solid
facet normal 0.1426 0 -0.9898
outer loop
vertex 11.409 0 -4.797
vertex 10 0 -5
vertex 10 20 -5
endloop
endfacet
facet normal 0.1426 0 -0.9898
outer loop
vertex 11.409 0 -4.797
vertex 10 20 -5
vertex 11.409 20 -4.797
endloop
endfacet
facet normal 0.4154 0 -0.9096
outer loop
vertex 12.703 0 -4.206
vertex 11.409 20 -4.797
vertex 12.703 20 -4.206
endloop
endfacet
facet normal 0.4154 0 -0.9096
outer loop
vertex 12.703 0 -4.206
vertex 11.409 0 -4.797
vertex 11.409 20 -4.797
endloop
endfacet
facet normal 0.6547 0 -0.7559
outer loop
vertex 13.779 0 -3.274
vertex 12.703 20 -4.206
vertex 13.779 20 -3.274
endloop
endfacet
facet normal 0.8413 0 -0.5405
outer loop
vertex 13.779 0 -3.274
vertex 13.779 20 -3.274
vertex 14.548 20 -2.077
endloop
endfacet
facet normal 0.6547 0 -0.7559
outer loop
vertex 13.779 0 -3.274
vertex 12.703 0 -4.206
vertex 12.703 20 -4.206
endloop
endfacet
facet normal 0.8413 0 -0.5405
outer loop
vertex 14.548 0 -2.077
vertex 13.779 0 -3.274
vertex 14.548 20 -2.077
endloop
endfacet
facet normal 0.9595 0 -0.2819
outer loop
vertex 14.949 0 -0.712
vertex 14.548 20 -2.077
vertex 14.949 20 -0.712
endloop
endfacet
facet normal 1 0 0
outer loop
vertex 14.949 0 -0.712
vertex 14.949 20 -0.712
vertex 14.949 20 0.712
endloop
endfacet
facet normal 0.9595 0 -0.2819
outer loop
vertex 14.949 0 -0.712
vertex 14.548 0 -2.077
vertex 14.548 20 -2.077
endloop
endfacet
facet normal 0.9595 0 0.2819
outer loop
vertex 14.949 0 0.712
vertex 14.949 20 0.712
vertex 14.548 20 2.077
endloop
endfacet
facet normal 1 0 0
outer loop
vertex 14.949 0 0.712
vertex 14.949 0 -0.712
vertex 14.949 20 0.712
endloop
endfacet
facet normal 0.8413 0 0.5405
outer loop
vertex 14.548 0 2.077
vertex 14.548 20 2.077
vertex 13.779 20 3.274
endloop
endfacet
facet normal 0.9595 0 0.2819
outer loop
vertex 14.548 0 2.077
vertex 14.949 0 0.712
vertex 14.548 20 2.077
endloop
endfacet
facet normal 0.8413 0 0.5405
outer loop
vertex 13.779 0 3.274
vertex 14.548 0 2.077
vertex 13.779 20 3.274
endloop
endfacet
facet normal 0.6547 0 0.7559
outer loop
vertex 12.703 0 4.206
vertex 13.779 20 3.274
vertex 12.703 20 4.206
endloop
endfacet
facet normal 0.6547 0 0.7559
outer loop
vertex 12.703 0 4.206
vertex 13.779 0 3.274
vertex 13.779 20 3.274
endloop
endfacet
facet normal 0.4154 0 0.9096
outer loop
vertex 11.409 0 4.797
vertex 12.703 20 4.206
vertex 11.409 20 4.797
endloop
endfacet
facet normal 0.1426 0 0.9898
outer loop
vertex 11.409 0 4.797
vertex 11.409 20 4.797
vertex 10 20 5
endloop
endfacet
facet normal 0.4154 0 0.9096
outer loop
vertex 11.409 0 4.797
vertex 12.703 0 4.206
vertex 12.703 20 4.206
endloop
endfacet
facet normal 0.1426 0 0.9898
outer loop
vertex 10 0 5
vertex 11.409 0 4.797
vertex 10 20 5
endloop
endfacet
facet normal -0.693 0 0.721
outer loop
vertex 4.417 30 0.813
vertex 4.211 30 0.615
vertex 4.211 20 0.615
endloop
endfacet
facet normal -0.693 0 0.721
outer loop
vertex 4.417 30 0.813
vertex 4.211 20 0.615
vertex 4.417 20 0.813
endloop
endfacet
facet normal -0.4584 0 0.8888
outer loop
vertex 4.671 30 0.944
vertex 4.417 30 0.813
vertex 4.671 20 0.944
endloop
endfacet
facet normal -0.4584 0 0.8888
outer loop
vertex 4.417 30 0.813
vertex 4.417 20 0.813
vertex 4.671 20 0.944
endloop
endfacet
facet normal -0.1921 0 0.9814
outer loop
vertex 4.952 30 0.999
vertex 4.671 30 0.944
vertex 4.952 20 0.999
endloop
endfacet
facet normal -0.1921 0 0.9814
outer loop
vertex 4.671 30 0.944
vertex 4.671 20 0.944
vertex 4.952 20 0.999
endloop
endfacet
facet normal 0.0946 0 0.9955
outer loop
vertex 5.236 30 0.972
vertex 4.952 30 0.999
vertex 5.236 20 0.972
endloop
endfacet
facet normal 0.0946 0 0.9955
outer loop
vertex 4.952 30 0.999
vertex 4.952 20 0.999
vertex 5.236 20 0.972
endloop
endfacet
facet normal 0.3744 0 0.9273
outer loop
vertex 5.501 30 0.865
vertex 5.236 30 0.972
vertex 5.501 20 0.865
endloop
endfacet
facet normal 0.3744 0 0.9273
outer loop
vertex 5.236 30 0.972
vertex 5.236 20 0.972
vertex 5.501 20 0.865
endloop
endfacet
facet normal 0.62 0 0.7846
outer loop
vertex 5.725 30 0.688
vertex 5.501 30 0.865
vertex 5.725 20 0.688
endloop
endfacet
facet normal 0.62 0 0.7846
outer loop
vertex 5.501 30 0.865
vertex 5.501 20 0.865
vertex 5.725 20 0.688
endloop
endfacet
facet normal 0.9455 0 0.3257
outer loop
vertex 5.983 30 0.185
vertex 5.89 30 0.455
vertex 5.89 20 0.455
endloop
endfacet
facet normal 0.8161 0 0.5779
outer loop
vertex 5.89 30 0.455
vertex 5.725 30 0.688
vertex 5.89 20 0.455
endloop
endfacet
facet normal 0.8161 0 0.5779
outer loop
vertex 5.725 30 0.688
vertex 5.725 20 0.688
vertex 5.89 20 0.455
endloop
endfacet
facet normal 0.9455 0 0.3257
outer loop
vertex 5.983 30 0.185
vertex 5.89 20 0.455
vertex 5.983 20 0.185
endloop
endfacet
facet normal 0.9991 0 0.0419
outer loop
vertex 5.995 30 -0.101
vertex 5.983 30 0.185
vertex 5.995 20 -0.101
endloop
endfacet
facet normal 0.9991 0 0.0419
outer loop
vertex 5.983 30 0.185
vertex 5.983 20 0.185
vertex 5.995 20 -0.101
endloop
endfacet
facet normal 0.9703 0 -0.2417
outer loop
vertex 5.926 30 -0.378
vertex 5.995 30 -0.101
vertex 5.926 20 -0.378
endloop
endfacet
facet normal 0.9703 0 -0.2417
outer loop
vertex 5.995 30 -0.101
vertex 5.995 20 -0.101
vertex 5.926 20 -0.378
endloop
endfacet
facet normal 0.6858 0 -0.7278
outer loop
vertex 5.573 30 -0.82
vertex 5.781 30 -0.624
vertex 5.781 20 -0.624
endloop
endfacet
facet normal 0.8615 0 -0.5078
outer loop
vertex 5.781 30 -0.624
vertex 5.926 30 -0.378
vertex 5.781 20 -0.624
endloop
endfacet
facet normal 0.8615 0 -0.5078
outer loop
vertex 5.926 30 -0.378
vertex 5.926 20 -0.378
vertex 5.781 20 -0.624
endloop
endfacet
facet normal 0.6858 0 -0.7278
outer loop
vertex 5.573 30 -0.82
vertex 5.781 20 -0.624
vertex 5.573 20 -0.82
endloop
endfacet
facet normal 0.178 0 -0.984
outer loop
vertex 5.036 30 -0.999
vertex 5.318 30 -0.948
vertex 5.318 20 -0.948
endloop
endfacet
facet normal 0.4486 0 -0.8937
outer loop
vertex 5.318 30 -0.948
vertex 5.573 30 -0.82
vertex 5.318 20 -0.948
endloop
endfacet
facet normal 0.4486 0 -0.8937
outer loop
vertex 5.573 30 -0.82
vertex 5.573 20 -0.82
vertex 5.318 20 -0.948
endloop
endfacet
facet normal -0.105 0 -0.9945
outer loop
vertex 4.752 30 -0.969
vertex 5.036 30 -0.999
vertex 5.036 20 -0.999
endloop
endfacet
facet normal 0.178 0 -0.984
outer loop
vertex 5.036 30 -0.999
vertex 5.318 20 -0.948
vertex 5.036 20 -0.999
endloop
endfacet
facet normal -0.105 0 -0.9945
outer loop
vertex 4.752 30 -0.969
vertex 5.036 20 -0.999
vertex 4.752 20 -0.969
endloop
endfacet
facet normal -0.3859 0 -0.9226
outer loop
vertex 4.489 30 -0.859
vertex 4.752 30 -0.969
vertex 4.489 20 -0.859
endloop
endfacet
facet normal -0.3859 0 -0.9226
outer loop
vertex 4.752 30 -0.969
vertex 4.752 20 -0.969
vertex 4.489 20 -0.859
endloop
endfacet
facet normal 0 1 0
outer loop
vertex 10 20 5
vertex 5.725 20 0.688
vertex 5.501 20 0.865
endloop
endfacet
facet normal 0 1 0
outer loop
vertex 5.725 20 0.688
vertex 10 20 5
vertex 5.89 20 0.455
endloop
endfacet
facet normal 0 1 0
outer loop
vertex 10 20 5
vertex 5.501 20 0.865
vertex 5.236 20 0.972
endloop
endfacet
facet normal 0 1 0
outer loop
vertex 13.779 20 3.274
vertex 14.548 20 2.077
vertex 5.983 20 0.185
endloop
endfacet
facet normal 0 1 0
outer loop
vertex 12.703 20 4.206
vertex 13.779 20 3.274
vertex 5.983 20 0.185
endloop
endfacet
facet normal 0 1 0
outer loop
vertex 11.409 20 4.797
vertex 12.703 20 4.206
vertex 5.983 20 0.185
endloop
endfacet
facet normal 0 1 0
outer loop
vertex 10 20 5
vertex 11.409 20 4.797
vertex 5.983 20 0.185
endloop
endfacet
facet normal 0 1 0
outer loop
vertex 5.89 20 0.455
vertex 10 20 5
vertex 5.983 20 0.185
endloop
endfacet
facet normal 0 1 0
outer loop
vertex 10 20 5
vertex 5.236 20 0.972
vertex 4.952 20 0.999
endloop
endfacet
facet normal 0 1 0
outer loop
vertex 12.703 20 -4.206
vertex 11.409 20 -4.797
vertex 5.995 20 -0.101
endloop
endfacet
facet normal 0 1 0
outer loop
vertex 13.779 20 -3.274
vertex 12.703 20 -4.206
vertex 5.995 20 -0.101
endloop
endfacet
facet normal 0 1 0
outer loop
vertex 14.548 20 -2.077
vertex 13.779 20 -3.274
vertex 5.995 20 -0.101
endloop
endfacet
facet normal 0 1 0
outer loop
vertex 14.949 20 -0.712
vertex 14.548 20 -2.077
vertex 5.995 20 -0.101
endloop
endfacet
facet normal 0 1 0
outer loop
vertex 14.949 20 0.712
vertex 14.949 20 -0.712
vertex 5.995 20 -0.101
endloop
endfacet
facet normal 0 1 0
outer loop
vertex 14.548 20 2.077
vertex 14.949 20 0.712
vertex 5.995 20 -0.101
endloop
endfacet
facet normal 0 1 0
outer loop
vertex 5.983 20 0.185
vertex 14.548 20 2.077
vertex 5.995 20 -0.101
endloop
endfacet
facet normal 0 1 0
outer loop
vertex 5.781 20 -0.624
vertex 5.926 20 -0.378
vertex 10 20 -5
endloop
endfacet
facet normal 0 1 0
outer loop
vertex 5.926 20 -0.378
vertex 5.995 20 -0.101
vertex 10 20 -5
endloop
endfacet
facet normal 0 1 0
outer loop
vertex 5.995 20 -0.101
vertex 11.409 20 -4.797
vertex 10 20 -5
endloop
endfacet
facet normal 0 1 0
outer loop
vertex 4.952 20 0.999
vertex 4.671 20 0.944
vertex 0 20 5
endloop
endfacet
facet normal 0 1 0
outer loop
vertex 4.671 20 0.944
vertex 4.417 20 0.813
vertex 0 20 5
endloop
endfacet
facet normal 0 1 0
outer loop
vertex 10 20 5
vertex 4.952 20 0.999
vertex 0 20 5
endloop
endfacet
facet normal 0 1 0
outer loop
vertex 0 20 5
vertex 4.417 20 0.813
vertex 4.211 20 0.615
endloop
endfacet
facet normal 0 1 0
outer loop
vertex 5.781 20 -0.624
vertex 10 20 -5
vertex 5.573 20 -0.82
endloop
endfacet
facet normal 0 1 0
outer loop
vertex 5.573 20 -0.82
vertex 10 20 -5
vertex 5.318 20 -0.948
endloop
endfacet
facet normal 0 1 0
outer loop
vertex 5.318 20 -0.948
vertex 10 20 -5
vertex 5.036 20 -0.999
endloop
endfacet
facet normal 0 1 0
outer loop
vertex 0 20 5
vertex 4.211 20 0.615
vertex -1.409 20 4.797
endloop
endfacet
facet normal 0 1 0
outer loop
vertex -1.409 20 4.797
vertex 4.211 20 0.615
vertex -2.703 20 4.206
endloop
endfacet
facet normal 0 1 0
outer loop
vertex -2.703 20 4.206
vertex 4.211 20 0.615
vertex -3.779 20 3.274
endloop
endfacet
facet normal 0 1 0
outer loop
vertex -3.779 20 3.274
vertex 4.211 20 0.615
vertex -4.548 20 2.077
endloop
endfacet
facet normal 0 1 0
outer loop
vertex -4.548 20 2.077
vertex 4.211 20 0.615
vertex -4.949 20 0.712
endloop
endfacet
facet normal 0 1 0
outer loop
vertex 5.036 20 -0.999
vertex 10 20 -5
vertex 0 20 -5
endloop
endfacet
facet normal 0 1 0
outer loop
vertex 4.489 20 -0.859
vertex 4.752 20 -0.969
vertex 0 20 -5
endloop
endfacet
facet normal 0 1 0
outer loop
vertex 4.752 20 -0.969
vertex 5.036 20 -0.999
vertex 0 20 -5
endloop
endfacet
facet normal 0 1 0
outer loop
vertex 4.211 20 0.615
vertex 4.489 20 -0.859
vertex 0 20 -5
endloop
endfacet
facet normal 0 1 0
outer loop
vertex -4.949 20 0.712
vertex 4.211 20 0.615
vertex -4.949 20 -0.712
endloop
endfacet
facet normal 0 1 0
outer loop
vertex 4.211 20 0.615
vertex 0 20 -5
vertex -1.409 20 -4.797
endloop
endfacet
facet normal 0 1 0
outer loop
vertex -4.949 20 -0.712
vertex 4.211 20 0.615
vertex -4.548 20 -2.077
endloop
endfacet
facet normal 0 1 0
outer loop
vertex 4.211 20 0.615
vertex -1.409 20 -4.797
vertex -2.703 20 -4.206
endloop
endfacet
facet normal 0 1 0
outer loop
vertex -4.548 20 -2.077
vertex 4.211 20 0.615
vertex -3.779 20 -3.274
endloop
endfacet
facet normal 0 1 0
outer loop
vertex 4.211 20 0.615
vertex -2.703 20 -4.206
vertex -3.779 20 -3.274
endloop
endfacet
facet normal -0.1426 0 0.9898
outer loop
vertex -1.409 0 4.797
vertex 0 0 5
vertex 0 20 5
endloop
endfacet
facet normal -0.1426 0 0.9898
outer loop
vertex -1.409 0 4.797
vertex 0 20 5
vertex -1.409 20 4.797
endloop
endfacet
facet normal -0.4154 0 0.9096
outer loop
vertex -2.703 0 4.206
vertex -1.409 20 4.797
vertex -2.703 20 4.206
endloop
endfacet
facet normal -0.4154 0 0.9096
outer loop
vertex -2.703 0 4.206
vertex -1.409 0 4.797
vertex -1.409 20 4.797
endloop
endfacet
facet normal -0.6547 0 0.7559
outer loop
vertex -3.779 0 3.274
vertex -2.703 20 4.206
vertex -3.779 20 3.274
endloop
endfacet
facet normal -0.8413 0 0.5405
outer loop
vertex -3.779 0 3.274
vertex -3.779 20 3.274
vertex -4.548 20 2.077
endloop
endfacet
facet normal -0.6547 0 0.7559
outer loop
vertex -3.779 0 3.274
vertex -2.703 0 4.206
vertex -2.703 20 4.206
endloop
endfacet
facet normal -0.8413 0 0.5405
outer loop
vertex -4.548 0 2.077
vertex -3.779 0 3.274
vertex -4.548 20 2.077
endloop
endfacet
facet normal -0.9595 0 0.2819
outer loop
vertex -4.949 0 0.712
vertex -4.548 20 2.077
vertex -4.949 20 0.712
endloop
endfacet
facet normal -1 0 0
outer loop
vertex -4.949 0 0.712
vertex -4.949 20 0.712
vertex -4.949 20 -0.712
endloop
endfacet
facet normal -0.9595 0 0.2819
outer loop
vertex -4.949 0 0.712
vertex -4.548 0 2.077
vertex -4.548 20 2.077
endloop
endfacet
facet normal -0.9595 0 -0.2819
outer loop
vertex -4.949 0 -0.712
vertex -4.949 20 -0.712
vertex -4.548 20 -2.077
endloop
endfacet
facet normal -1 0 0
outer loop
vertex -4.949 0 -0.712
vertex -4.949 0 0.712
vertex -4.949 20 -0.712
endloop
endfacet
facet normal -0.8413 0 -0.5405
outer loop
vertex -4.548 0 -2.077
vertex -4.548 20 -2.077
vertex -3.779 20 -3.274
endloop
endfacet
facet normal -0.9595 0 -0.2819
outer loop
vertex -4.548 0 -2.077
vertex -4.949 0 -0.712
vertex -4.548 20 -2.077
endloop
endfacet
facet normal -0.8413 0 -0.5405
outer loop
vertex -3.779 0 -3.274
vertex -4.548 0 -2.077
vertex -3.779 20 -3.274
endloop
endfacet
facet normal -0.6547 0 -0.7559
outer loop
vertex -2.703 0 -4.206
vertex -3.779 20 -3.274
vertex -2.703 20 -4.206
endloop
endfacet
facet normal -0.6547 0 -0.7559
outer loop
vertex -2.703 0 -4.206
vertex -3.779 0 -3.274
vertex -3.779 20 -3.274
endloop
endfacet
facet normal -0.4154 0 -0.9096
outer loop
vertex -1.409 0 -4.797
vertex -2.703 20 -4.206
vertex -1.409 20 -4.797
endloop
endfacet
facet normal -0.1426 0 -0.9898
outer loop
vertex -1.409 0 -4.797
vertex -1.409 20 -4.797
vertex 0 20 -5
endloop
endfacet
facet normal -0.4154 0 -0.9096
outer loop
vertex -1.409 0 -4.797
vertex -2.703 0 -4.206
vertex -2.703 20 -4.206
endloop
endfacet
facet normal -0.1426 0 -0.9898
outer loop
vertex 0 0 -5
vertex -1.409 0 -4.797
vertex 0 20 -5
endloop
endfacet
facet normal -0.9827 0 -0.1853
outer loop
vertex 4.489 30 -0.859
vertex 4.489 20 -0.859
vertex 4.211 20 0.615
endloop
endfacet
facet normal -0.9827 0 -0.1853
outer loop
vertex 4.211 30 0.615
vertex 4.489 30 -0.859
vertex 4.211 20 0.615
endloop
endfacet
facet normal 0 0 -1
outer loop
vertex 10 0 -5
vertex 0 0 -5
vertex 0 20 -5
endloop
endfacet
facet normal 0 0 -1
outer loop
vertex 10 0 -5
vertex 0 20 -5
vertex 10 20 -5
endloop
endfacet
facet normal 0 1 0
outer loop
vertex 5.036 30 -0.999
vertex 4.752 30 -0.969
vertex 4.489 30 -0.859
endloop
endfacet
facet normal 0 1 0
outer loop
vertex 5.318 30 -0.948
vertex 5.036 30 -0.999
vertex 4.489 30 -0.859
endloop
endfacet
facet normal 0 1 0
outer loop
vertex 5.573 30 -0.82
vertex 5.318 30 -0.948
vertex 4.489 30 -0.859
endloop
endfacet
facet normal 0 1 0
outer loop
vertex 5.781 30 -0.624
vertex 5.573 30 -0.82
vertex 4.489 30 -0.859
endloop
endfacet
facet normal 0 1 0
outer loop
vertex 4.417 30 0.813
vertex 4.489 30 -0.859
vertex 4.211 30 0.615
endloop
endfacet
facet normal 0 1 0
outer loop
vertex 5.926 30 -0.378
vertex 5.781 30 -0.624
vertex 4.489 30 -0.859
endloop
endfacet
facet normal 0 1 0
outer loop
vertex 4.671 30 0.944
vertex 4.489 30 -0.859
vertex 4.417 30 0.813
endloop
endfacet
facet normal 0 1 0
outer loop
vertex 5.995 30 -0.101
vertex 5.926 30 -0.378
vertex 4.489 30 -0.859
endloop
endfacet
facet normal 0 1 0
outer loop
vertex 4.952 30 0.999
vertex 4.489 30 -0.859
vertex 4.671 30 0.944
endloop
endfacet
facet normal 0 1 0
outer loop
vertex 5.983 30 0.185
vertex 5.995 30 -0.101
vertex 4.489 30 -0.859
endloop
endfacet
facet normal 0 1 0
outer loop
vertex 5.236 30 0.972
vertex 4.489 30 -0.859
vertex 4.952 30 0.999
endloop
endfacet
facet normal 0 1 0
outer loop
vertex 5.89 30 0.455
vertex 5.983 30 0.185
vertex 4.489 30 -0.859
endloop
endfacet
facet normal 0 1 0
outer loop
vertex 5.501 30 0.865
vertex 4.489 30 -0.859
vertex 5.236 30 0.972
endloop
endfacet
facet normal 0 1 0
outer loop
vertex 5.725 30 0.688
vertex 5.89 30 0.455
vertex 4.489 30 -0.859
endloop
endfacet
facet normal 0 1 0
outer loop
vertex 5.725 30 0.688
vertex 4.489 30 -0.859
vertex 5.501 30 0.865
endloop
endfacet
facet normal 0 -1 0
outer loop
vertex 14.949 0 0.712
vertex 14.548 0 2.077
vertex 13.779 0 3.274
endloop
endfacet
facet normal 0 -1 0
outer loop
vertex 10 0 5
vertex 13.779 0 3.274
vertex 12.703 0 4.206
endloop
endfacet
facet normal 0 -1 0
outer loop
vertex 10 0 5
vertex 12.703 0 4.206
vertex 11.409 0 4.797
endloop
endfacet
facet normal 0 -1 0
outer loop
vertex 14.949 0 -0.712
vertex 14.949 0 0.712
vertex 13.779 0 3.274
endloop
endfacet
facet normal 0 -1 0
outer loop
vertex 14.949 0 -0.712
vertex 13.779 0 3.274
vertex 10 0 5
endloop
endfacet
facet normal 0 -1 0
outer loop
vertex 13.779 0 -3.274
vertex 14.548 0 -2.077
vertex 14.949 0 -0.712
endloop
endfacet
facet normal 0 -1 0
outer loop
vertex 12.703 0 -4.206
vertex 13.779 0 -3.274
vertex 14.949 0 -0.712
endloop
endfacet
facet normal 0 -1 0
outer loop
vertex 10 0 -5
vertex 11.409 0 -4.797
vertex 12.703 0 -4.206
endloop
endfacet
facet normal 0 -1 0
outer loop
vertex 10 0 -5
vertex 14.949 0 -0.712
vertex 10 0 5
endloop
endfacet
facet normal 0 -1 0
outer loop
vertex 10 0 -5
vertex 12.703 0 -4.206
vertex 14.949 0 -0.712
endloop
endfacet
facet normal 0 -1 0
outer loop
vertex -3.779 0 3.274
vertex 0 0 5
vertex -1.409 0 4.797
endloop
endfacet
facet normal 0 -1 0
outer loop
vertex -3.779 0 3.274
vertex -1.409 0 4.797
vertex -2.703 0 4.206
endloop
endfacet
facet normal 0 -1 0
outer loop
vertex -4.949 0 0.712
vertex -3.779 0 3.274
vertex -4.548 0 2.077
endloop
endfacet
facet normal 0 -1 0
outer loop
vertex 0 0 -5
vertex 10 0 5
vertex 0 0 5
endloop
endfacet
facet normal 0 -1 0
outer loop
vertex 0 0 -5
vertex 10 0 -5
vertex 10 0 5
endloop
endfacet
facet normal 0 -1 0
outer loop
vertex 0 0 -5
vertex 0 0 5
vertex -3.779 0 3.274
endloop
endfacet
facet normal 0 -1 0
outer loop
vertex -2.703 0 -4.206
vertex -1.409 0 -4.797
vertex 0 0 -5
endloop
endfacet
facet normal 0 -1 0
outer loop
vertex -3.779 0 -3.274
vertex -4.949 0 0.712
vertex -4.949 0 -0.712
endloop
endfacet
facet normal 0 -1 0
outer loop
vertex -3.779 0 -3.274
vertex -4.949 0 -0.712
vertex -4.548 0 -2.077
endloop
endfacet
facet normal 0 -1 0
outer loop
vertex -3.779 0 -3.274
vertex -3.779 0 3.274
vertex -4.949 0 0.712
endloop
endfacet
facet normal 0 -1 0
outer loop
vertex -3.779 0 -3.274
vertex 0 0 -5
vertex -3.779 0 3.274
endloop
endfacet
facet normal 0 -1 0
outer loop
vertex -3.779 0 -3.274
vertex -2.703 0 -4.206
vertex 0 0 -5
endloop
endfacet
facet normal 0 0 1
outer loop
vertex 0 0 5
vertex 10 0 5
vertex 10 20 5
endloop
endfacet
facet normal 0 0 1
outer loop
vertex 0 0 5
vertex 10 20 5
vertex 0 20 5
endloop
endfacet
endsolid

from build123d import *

# Parameters (mm, degrees)
BOSS_EXTRUDE1_DEPTH = 20
SKETCH4_R           = 1
BOSS_EXTRUDE2_DEPTH = 10
CUT_EXTRUDE1_START  = -10
CUT_EXTRUDE1_DEPTH  = 10


with BuildPart() as part:
    # Sketch1 → Boss-Extrude1 (new body)
    with BuildSketch(Plane(origin=(0, 0, 0), x_dir=(1, 0, 0), z_dir=(0, 1, 0))):
        with BuildLine():
            Line((0, 5), (10, 5))
            ThreePointArc((10, 5), (15, 0), (10, -5))
            Line((10, -5), (0, -5))
            ThreePointArc((0, -5), (-5, 0), (0, 5))
        make_face()
    extrude(amount=BOSS_EXTRUDE1_DEPTH)

    # Sketch4 → Boss-Extrude2 (add)
    with BuildSketch(Plane(origin=(0, 20, 0), x_dir=(1, 0, 0), z_dir=(0, 1, 0))):
        with Locations(Location((5, 0, 0), (0, 0, 270))):
            Circle(SKETCH4_R)
    extrude(amount=BOSS_EXTRUDE2_DEPTH)

    # Sketch5 → Cut-Extrude1 (cut)
    with BuildSketch(Plane(origin=(0, 30, 0), x_dir=(1, 0, 0), z_dir=(0, 1, 0)).offset(CUT_EXTRUDE1_START)):
        with BuildLine():
            Line((4.488521887, 0.859296305), (4.211378142, -0.614878497))
            ThreePointArc((4.211378142, -0.614878497), (4.017216799, 0.184762496), (4.488521887, 0.859296305))
        make_face()
    extrude(amount=CUT_EXTRUDE1_DEPTH, mode=Mode.SUBTRACT)


solid = part.part
